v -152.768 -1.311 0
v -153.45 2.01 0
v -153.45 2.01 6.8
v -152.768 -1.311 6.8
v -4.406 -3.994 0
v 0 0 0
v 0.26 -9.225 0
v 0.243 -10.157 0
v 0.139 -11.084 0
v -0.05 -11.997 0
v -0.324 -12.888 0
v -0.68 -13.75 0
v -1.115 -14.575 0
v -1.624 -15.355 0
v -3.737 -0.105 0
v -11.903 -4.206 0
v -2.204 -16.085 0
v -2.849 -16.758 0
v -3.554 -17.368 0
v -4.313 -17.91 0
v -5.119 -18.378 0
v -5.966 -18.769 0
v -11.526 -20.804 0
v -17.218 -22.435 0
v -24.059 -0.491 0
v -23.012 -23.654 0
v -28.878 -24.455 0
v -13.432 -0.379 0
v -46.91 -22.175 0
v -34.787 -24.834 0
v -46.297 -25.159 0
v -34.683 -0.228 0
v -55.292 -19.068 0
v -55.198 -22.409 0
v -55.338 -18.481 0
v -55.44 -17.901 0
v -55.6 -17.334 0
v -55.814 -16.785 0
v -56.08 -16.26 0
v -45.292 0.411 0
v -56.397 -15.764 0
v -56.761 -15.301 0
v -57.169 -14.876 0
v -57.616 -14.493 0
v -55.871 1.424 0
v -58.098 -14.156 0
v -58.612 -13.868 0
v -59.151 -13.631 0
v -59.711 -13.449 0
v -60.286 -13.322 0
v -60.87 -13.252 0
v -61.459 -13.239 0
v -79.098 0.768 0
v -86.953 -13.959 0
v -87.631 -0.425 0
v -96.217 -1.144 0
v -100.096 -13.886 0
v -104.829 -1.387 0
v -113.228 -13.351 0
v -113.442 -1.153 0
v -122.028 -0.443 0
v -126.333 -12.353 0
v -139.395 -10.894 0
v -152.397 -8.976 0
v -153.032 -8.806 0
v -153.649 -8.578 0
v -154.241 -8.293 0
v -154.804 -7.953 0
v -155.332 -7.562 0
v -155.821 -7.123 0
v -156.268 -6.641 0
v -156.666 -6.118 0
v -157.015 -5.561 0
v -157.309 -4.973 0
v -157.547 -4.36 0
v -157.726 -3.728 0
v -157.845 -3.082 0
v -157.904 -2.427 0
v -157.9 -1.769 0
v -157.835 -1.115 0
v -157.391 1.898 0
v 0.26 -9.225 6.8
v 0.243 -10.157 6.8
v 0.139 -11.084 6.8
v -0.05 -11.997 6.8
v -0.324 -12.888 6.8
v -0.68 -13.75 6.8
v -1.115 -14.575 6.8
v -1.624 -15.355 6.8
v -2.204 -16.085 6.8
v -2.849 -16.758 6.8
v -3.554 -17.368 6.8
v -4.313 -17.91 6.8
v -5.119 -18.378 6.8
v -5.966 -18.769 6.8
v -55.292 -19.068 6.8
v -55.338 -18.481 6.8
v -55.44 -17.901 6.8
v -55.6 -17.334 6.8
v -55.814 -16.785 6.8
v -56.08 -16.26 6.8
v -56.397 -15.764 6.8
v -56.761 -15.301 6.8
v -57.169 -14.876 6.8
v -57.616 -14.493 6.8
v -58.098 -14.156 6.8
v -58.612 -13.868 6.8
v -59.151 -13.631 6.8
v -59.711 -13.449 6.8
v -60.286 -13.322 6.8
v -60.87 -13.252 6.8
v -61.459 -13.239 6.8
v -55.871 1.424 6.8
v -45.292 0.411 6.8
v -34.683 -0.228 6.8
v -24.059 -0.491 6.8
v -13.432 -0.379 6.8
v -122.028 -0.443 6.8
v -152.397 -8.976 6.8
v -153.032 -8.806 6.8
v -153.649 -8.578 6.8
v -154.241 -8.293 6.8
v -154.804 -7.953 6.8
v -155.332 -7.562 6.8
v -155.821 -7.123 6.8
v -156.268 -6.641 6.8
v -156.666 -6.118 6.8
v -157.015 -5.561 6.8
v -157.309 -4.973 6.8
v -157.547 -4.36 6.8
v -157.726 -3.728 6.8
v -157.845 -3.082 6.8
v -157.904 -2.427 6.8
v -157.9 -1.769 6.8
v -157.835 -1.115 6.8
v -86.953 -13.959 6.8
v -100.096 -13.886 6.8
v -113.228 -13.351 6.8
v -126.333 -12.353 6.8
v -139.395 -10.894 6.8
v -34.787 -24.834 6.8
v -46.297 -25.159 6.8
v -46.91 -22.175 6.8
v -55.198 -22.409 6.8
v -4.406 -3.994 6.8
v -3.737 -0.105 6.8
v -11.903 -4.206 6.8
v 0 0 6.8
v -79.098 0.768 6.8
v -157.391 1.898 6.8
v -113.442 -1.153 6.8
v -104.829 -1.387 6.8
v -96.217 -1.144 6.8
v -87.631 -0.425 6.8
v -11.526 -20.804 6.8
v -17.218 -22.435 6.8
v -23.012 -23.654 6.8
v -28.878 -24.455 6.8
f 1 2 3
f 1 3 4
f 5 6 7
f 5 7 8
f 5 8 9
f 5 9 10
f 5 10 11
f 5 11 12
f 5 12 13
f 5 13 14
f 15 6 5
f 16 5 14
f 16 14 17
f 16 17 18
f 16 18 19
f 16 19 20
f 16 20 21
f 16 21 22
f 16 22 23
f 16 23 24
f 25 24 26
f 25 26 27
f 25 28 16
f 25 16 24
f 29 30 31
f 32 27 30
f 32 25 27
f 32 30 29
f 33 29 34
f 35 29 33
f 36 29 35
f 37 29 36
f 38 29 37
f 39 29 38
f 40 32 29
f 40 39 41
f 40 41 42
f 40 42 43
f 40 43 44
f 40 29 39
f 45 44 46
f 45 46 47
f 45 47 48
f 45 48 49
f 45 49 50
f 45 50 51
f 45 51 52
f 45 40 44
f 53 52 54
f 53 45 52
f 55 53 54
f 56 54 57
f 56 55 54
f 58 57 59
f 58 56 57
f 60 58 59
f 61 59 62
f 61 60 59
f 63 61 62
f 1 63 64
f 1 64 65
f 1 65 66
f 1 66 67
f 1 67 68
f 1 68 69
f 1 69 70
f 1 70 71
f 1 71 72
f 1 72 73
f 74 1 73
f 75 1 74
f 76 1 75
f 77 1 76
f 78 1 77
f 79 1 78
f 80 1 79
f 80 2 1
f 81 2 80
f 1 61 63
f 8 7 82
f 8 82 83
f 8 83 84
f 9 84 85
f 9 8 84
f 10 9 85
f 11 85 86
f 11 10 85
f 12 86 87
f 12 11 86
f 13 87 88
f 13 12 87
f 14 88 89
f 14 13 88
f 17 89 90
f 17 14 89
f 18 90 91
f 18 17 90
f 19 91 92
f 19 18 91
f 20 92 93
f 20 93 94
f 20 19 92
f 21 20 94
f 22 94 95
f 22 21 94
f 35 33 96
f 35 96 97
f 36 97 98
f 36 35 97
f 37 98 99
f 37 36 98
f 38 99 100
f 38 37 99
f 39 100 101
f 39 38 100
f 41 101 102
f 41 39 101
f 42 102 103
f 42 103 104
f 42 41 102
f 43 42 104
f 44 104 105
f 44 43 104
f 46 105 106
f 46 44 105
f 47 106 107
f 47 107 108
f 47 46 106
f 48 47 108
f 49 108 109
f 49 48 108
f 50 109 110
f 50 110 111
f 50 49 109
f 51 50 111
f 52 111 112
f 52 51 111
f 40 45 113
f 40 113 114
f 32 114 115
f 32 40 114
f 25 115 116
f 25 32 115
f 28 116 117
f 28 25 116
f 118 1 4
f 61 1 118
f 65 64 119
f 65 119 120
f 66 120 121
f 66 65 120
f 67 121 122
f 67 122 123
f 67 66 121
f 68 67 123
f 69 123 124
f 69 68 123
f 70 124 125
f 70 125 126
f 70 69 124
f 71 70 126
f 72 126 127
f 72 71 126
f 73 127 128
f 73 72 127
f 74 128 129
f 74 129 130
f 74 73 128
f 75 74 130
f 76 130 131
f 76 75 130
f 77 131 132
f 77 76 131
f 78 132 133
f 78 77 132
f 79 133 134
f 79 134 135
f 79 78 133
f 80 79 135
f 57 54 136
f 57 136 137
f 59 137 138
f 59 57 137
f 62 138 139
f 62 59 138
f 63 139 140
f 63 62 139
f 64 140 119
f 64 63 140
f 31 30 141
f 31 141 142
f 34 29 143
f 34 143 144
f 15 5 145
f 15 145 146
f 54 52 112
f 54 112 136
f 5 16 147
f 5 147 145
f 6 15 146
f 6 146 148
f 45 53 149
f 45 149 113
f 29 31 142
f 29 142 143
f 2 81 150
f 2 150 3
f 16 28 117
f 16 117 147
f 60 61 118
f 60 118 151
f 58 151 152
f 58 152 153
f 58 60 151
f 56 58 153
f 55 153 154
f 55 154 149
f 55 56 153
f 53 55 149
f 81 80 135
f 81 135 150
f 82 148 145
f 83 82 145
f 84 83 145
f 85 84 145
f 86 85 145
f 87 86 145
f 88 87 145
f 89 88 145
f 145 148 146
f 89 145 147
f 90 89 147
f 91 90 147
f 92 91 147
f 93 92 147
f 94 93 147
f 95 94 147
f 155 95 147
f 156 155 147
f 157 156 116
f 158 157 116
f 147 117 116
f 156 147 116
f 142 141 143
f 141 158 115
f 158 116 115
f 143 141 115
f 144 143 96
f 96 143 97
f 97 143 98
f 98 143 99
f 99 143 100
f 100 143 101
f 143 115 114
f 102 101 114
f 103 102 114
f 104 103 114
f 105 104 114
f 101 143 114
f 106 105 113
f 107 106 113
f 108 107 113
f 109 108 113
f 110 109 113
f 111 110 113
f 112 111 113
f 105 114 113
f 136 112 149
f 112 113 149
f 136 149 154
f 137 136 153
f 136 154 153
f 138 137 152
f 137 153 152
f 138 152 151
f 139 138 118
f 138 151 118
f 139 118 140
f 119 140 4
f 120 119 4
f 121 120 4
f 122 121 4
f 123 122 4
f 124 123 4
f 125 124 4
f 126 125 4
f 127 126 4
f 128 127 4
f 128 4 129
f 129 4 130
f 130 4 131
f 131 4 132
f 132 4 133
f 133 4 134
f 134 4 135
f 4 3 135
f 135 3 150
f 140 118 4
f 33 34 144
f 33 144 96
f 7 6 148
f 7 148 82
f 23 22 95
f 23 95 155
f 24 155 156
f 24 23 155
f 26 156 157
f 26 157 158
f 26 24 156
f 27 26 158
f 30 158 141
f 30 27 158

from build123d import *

# Parameters (mm, degrees)
BOSS_EXTRUDE1_DEPTH = 6.8


with BuildPart() as part:
    # Sketch1 → Boss-Extrude1 (new body)
    with BuildSketch(Plane.XY):
        with BuildLine():
            Line((-3.736553352, -0.105475371), (0, 0))
            Line((0, 0), (0.260408581, -9.22519204))
            ThreePointArc((0.260408581, -9.22519204), (-1.360098109, -14.970948565), (-5.965617029, -18.769495059))
            ThreePointArc((-5.965617029, -18.769495059), (-20.103980037, -23.096122462), (-34.787070991, -24.833894972))
            Line((-34.787070991, -24.833894972), (-46.296555972, -25.15878454))
            Line((-46.296555972, -25.15878454), (-46.909976525, -22.174905175))
            Line((-46.909976525, -22.174905175), (-55.197899778, -22.408856547))
            Line((-55.197899778, -22.408856547), (-55.292212243, -19.06775851))
            ThreePointArc((-55.292212243, -19.06775851), (-57.168585337, -14.876394082), (-61.459123685, -13.239448011))
            Line((-61.459123685, -13.239448011), (-86.952751483, -13.959081751))
            ThreePointArc((-86.952751483, -13.959081751), (-119.784800915, -12.909412184), (-152.397282866, -8.976055209))
            ThreePointArc((-152.397282866, -8.976055209), (-156.666477303, -6.118238551), (-157.834820075, -1.115428104))
            Line((-157.834820075, -1.115428104), (-157.390699994, 1.898303501))
            Line((-157.390699994, 1.898303501), (-153.450231486, 2.009534988))
            Line((-153.450231486, 2.009534988), (-152.767576007, -1.311125833))
            Line((-152.767576007, -1.311125833), (-122.028102345, -0.443412436))
            ThreePointArc((-122.028102345, -0.443412436), (-100.521194384, -1.324753836), (-79.098250735, 0.768410766))
            Line((-79.098250735, 0.768410766), (-55.870655521, 1.424078972))
            ThreePointArc((-55.870655521, 1.424078972), (-34.68336237, -0.227804683), (-13.432310629, -0.379167061))
            Line((-13.432310629, -0.379167061), (-11.903069428, -4.205729222))
            Line((-11.903069428, -4.205729222), (-4.406055716, -3.994103632))
            Line((-4.406055716, -3.994103632), (-3.736553352, -0.105475371))
        make_face()
    extrude(amount=BOSS_EXTRUDE1_DEPTH)


solid = part.part
